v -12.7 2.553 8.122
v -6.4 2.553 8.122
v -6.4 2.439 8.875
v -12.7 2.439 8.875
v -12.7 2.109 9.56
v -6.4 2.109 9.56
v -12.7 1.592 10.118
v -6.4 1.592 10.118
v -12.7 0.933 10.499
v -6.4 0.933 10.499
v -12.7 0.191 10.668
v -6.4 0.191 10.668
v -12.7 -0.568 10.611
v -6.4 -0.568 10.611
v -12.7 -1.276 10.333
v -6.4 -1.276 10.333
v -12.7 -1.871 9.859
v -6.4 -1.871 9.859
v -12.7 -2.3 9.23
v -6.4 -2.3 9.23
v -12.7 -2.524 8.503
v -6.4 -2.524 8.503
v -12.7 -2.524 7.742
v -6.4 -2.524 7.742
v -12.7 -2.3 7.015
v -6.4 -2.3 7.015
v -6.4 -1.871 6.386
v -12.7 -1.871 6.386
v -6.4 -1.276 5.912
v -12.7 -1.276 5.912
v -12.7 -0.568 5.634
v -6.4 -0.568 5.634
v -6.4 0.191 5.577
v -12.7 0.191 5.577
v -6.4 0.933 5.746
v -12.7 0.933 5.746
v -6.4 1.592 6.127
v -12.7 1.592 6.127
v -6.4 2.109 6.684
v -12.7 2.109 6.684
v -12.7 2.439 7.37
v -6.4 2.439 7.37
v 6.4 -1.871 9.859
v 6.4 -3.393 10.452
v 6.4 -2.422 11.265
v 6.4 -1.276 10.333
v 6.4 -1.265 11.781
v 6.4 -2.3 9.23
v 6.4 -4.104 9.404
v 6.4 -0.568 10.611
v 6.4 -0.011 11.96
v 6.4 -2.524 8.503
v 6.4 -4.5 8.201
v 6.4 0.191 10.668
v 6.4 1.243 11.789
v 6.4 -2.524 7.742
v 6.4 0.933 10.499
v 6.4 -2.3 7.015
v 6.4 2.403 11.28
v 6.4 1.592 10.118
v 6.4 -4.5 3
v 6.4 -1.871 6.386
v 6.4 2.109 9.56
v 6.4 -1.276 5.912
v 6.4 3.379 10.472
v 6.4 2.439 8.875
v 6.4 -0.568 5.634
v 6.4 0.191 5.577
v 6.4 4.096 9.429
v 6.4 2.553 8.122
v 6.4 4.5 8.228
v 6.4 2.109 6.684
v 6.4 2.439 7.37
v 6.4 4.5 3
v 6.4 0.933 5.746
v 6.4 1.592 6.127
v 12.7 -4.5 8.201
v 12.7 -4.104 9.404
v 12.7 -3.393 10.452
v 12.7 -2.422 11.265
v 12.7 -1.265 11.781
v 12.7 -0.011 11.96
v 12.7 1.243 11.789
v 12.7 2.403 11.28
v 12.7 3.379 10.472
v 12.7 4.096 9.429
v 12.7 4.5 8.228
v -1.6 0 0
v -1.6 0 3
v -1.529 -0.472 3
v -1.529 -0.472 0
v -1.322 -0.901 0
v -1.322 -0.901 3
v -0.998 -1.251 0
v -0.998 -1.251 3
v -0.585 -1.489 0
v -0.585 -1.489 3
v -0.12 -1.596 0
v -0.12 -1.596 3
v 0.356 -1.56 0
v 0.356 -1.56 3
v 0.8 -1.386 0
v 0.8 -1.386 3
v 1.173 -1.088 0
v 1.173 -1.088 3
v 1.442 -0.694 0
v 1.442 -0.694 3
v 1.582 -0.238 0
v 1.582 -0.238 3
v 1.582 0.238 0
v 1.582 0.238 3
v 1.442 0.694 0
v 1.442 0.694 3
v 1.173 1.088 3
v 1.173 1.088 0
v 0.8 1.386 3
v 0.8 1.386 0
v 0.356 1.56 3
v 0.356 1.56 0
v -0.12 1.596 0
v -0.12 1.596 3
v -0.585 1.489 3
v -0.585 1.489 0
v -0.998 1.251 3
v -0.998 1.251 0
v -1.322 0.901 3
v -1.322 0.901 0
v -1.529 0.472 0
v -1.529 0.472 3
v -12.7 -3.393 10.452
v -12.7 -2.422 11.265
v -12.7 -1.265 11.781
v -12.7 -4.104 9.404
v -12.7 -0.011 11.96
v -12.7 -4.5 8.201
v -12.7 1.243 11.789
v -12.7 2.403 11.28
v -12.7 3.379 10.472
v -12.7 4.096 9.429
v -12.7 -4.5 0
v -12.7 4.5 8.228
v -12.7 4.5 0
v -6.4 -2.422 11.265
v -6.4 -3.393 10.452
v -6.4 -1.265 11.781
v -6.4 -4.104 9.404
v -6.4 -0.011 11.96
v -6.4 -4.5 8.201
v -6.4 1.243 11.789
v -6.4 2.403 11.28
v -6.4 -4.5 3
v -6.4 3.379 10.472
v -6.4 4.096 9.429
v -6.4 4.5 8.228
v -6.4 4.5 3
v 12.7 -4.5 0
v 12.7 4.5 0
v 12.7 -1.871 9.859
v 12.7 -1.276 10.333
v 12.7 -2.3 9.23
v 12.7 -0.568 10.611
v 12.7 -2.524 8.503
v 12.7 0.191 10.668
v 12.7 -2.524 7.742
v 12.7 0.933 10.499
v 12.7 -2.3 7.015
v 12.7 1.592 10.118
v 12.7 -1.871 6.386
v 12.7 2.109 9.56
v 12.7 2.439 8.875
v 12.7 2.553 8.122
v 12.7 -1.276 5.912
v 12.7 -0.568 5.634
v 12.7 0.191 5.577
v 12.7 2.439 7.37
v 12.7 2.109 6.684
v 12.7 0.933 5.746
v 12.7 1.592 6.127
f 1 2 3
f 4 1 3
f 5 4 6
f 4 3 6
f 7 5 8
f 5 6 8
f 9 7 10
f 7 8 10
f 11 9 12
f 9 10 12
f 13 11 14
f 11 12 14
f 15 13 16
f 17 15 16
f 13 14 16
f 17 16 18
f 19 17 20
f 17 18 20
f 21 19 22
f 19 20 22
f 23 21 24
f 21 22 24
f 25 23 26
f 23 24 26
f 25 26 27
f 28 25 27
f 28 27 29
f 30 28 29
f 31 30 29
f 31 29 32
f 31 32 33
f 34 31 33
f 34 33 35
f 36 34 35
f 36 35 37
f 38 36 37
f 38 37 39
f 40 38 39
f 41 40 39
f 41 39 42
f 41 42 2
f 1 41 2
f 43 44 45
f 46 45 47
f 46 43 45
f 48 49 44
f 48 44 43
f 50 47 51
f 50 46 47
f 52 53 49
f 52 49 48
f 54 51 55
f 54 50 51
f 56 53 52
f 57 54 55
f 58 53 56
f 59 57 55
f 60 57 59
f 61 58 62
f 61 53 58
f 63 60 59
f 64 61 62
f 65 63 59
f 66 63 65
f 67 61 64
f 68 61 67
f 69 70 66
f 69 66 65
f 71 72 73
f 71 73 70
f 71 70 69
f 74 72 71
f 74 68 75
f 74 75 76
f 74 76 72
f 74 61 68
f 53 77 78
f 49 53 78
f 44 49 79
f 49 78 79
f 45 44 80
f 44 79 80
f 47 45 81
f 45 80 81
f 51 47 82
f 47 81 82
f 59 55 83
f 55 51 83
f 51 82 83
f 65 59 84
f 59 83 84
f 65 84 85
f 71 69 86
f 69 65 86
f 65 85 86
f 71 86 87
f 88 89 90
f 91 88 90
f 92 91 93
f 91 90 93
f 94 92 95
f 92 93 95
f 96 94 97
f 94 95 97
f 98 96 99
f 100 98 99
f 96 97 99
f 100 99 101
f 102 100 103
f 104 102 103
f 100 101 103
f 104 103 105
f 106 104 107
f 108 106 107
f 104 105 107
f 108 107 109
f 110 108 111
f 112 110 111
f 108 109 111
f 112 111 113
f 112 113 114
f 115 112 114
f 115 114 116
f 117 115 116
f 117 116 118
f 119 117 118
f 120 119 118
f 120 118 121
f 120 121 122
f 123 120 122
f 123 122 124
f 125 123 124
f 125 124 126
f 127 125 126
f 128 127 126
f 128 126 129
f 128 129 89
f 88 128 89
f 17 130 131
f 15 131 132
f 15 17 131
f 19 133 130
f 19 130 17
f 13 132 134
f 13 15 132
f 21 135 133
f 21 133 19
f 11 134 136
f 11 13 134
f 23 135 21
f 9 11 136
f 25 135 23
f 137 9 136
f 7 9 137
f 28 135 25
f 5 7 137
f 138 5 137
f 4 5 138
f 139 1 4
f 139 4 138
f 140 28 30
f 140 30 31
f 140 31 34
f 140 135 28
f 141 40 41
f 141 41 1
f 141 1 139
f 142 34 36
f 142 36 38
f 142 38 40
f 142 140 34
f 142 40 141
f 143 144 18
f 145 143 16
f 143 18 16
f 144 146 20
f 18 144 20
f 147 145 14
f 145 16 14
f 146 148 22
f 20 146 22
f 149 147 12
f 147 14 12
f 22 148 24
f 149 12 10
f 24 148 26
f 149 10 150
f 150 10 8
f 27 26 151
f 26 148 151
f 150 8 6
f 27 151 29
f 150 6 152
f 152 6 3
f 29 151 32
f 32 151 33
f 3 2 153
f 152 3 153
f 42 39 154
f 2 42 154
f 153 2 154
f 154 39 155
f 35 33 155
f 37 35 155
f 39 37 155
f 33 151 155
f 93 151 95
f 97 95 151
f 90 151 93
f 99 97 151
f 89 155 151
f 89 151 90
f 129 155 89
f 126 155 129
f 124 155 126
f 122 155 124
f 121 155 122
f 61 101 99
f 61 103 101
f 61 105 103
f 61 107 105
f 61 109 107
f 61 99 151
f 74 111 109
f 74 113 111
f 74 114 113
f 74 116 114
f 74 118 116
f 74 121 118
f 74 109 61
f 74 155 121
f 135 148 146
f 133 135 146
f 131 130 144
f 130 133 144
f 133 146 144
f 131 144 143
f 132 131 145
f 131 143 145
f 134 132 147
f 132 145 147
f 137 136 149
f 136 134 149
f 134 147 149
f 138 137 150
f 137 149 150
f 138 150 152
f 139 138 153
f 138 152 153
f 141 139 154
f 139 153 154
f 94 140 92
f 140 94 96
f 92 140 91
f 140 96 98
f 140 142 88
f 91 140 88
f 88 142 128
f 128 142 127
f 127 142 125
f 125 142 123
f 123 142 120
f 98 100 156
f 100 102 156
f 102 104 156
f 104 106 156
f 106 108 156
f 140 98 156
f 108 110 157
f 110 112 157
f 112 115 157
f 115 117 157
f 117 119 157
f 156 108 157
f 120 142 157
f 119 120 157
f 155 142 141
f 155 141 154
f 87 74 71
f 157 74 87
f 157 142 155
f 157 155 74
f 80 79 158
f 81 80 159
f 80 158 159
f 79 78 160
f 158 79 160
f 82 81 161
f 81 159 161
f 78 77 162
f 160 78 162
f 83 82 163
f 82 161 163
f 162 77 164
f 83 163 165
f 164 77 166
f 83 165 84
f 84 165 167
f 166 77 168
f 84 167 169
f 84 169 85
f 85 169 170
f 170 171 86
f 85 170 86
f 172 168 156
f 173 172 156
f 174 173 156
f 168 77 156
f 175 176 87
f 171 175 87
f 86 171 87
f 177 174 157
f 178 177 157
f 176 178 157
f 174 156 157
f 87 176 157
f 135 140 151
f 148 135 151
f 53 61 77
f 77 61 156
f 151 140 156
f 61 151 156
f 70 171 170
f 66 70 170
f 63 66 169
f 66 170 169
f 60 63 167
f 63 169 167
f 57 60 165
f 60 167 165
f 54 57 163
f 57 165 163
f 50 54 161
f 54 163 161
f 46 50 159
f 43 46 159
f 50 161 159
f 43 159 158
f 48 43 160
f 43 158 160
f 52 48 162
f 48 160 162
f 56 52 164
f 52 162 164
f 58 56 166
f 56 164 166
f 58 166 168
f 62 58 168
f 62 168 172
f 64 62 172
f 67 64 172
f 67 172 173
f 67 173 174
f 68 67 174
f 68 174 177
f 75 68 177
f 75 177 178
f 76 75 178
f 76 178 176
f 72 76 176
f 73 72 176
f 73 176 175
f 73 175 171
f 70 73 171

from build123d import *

# Parameters (mm, degrees)
F0_W     = 25.4
F0_H     = 9
F1_DEPTH = 3
F2_W     = 6.3
F2_H     = 9
F3_DEPTH = 9
F5_DEPTH = 25
F6_DEPTH = 25
F8_D     = 5.1054
F9_D     = 3.2


with BuildPart() as f1:
    # F0 (on Top) → F1 (new body)
    with BuildSketch(Plane.XY):
        Rectangle(F0_W, F0_H)
    extrude(amount=F1_DEPTH)

    # F2 (on face) → F3 (join)
    with BuildSketch(Plane.XY.offset(3)):
        with Locations((-9.55, 0)):
            Rectangle(F2_W, F2_H)
        with Locations((9.55, 0)):
            Rectangle(F2_W, F2_H)
    extrude(amount=F3_DEPTH)

    # F4 (on face) → F5 (cut)
    with BuildSketch(Plane.YZ.offset(12.7)):
        with BuildLine():
            ThreePointArc((-4.5, 8.2006715238), (-0.0114142109, 11.9599530691), (4.5, 8.2280980423))
            Line((4.5, 8.2280980423), (4.5, 12))
            Line((4.5, 12), (-4.5, 12))
            Line((-4.5, 12), (-4.5, 8.2006715238))
        make_face()
    extrude(amount=-F5_DEPTH, mode=Mode.SUBTRACT)

    # F6 (cut): a face of the model
    f6_faces = [f1.faces().sort_by_distance(p)[0] for p in [
        (-12.3, -0.0114439809, 11.9697221024),
    ]]
    extrude(f6_faces, amount=-F6_DEPTH, mode=Mode.SUBTRACT)

    # F8 (through all)
    with Locations(Plane(origin=(-12.7, 0, 0), x_dir=(0, -1, 0), z_dir=(-1, 0, 0))):
        with Locations((0, 8.1223854795)):
            Hole(F8_D / 2)

    # F9 (through all)
    with Locations(Plane(origin=(0, 0, 0), x_dir=(1, 0, 0), z_dir=(0, 0, -1))):
        with Locations((0, 0)):
            Hole(F9_D / 2)


solid = f1.part
